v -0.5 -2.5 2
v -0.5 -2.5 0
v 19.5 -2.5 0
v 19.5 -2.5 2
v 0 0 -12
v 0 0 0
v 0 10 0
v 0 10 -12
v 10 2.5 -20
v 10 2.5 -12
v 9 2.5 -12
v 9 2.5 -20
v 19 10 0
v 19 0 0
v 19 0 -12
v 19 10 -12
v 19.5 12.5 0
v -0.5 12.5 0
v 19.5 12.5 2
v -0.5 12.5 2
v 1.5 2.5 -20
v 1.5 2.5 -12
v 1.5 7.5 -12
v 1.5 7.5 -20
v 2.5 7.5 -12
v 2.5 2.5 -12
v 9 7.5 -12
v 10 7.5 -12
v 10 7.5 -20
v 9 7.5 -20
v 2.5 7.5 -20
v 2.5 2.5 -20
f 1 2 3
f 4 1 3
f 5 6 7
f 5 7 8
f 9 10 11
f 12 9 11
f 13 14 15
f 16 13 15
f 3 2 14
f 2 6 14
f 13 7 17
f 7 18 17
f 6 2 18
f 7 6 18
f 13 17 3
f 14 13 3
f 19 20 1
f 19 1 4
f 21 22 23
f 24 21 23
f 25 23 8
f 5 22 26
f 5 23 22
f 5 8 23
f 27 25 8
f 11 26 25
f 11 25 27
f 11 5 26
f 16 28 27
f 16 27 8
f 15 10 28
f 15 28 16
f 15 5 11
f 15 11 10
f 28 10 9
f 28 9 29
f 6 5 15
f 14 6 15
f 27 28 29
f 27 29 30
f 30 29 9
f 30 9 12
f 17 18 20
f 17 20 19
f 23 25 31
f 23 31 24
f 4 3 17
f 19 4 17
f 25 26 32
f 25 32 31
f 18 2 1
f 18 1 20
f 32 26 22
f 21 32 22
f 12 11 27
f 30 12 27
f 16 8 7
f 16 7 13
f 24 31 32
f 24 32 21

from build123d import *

# Parameters (mm, degrees)
ESQUISSE1_W        = 19
ESQUISSE1_H        = 12
BOSS_EXTRU_1_DEPTH = 10
ESQUISSE2_W        = 20
ESQUISSE2_H        = 15
BOSS_EXTRU_2_DEPTH = 2
ESQUISSE3_W        = 1
ESQUISSE3_H        = 5
BOSS_EXTRU_3_DEPTH = 8


with BuildPart() as part:
    # Esquisse1 → Boss.-Extru.1 (new body)
    with BuildSketch(Plane(origin=(0, 0, 0), x_dir=(1, 0, 0), z_dir=(0, 1, 0))):
        with Locations((9.5, 6)):
            Rectangle(ESQUISSE1_W, ESQUISSE1_H)
    extrude(amount=BOSS_EXTRU_1_DEPTH)

    # Esquisse2 → Boss.-Extru.2 (add)
    with BuildSketch(Plane.XY):
        with Locations((9.5, 5)):
            Rectangle(ESQUISSE2_W, ESQUISSE2_H)
    extrude(amount=BOSS_EXTRU_2_DEPTH)

    # Esquisse3 → Boss.-Extru.3 (add)
    with BuildSketch(Plane(origin=(0, 0, -12), x_dir=(-1, 0, 0), z_dir=(0, 0, -1))):
        with Locations((-9.5, 5)):
            Rectangle(ESQUISSE3_W, ESQUISSE3_H)
        with Locations((-2, 5)):
            Rectangle(ESQUISSE3_W, ESQUISSE3_H)
    extrude(amount=BOSS_EXTRU_3_DEPTH)


solid = part.part
